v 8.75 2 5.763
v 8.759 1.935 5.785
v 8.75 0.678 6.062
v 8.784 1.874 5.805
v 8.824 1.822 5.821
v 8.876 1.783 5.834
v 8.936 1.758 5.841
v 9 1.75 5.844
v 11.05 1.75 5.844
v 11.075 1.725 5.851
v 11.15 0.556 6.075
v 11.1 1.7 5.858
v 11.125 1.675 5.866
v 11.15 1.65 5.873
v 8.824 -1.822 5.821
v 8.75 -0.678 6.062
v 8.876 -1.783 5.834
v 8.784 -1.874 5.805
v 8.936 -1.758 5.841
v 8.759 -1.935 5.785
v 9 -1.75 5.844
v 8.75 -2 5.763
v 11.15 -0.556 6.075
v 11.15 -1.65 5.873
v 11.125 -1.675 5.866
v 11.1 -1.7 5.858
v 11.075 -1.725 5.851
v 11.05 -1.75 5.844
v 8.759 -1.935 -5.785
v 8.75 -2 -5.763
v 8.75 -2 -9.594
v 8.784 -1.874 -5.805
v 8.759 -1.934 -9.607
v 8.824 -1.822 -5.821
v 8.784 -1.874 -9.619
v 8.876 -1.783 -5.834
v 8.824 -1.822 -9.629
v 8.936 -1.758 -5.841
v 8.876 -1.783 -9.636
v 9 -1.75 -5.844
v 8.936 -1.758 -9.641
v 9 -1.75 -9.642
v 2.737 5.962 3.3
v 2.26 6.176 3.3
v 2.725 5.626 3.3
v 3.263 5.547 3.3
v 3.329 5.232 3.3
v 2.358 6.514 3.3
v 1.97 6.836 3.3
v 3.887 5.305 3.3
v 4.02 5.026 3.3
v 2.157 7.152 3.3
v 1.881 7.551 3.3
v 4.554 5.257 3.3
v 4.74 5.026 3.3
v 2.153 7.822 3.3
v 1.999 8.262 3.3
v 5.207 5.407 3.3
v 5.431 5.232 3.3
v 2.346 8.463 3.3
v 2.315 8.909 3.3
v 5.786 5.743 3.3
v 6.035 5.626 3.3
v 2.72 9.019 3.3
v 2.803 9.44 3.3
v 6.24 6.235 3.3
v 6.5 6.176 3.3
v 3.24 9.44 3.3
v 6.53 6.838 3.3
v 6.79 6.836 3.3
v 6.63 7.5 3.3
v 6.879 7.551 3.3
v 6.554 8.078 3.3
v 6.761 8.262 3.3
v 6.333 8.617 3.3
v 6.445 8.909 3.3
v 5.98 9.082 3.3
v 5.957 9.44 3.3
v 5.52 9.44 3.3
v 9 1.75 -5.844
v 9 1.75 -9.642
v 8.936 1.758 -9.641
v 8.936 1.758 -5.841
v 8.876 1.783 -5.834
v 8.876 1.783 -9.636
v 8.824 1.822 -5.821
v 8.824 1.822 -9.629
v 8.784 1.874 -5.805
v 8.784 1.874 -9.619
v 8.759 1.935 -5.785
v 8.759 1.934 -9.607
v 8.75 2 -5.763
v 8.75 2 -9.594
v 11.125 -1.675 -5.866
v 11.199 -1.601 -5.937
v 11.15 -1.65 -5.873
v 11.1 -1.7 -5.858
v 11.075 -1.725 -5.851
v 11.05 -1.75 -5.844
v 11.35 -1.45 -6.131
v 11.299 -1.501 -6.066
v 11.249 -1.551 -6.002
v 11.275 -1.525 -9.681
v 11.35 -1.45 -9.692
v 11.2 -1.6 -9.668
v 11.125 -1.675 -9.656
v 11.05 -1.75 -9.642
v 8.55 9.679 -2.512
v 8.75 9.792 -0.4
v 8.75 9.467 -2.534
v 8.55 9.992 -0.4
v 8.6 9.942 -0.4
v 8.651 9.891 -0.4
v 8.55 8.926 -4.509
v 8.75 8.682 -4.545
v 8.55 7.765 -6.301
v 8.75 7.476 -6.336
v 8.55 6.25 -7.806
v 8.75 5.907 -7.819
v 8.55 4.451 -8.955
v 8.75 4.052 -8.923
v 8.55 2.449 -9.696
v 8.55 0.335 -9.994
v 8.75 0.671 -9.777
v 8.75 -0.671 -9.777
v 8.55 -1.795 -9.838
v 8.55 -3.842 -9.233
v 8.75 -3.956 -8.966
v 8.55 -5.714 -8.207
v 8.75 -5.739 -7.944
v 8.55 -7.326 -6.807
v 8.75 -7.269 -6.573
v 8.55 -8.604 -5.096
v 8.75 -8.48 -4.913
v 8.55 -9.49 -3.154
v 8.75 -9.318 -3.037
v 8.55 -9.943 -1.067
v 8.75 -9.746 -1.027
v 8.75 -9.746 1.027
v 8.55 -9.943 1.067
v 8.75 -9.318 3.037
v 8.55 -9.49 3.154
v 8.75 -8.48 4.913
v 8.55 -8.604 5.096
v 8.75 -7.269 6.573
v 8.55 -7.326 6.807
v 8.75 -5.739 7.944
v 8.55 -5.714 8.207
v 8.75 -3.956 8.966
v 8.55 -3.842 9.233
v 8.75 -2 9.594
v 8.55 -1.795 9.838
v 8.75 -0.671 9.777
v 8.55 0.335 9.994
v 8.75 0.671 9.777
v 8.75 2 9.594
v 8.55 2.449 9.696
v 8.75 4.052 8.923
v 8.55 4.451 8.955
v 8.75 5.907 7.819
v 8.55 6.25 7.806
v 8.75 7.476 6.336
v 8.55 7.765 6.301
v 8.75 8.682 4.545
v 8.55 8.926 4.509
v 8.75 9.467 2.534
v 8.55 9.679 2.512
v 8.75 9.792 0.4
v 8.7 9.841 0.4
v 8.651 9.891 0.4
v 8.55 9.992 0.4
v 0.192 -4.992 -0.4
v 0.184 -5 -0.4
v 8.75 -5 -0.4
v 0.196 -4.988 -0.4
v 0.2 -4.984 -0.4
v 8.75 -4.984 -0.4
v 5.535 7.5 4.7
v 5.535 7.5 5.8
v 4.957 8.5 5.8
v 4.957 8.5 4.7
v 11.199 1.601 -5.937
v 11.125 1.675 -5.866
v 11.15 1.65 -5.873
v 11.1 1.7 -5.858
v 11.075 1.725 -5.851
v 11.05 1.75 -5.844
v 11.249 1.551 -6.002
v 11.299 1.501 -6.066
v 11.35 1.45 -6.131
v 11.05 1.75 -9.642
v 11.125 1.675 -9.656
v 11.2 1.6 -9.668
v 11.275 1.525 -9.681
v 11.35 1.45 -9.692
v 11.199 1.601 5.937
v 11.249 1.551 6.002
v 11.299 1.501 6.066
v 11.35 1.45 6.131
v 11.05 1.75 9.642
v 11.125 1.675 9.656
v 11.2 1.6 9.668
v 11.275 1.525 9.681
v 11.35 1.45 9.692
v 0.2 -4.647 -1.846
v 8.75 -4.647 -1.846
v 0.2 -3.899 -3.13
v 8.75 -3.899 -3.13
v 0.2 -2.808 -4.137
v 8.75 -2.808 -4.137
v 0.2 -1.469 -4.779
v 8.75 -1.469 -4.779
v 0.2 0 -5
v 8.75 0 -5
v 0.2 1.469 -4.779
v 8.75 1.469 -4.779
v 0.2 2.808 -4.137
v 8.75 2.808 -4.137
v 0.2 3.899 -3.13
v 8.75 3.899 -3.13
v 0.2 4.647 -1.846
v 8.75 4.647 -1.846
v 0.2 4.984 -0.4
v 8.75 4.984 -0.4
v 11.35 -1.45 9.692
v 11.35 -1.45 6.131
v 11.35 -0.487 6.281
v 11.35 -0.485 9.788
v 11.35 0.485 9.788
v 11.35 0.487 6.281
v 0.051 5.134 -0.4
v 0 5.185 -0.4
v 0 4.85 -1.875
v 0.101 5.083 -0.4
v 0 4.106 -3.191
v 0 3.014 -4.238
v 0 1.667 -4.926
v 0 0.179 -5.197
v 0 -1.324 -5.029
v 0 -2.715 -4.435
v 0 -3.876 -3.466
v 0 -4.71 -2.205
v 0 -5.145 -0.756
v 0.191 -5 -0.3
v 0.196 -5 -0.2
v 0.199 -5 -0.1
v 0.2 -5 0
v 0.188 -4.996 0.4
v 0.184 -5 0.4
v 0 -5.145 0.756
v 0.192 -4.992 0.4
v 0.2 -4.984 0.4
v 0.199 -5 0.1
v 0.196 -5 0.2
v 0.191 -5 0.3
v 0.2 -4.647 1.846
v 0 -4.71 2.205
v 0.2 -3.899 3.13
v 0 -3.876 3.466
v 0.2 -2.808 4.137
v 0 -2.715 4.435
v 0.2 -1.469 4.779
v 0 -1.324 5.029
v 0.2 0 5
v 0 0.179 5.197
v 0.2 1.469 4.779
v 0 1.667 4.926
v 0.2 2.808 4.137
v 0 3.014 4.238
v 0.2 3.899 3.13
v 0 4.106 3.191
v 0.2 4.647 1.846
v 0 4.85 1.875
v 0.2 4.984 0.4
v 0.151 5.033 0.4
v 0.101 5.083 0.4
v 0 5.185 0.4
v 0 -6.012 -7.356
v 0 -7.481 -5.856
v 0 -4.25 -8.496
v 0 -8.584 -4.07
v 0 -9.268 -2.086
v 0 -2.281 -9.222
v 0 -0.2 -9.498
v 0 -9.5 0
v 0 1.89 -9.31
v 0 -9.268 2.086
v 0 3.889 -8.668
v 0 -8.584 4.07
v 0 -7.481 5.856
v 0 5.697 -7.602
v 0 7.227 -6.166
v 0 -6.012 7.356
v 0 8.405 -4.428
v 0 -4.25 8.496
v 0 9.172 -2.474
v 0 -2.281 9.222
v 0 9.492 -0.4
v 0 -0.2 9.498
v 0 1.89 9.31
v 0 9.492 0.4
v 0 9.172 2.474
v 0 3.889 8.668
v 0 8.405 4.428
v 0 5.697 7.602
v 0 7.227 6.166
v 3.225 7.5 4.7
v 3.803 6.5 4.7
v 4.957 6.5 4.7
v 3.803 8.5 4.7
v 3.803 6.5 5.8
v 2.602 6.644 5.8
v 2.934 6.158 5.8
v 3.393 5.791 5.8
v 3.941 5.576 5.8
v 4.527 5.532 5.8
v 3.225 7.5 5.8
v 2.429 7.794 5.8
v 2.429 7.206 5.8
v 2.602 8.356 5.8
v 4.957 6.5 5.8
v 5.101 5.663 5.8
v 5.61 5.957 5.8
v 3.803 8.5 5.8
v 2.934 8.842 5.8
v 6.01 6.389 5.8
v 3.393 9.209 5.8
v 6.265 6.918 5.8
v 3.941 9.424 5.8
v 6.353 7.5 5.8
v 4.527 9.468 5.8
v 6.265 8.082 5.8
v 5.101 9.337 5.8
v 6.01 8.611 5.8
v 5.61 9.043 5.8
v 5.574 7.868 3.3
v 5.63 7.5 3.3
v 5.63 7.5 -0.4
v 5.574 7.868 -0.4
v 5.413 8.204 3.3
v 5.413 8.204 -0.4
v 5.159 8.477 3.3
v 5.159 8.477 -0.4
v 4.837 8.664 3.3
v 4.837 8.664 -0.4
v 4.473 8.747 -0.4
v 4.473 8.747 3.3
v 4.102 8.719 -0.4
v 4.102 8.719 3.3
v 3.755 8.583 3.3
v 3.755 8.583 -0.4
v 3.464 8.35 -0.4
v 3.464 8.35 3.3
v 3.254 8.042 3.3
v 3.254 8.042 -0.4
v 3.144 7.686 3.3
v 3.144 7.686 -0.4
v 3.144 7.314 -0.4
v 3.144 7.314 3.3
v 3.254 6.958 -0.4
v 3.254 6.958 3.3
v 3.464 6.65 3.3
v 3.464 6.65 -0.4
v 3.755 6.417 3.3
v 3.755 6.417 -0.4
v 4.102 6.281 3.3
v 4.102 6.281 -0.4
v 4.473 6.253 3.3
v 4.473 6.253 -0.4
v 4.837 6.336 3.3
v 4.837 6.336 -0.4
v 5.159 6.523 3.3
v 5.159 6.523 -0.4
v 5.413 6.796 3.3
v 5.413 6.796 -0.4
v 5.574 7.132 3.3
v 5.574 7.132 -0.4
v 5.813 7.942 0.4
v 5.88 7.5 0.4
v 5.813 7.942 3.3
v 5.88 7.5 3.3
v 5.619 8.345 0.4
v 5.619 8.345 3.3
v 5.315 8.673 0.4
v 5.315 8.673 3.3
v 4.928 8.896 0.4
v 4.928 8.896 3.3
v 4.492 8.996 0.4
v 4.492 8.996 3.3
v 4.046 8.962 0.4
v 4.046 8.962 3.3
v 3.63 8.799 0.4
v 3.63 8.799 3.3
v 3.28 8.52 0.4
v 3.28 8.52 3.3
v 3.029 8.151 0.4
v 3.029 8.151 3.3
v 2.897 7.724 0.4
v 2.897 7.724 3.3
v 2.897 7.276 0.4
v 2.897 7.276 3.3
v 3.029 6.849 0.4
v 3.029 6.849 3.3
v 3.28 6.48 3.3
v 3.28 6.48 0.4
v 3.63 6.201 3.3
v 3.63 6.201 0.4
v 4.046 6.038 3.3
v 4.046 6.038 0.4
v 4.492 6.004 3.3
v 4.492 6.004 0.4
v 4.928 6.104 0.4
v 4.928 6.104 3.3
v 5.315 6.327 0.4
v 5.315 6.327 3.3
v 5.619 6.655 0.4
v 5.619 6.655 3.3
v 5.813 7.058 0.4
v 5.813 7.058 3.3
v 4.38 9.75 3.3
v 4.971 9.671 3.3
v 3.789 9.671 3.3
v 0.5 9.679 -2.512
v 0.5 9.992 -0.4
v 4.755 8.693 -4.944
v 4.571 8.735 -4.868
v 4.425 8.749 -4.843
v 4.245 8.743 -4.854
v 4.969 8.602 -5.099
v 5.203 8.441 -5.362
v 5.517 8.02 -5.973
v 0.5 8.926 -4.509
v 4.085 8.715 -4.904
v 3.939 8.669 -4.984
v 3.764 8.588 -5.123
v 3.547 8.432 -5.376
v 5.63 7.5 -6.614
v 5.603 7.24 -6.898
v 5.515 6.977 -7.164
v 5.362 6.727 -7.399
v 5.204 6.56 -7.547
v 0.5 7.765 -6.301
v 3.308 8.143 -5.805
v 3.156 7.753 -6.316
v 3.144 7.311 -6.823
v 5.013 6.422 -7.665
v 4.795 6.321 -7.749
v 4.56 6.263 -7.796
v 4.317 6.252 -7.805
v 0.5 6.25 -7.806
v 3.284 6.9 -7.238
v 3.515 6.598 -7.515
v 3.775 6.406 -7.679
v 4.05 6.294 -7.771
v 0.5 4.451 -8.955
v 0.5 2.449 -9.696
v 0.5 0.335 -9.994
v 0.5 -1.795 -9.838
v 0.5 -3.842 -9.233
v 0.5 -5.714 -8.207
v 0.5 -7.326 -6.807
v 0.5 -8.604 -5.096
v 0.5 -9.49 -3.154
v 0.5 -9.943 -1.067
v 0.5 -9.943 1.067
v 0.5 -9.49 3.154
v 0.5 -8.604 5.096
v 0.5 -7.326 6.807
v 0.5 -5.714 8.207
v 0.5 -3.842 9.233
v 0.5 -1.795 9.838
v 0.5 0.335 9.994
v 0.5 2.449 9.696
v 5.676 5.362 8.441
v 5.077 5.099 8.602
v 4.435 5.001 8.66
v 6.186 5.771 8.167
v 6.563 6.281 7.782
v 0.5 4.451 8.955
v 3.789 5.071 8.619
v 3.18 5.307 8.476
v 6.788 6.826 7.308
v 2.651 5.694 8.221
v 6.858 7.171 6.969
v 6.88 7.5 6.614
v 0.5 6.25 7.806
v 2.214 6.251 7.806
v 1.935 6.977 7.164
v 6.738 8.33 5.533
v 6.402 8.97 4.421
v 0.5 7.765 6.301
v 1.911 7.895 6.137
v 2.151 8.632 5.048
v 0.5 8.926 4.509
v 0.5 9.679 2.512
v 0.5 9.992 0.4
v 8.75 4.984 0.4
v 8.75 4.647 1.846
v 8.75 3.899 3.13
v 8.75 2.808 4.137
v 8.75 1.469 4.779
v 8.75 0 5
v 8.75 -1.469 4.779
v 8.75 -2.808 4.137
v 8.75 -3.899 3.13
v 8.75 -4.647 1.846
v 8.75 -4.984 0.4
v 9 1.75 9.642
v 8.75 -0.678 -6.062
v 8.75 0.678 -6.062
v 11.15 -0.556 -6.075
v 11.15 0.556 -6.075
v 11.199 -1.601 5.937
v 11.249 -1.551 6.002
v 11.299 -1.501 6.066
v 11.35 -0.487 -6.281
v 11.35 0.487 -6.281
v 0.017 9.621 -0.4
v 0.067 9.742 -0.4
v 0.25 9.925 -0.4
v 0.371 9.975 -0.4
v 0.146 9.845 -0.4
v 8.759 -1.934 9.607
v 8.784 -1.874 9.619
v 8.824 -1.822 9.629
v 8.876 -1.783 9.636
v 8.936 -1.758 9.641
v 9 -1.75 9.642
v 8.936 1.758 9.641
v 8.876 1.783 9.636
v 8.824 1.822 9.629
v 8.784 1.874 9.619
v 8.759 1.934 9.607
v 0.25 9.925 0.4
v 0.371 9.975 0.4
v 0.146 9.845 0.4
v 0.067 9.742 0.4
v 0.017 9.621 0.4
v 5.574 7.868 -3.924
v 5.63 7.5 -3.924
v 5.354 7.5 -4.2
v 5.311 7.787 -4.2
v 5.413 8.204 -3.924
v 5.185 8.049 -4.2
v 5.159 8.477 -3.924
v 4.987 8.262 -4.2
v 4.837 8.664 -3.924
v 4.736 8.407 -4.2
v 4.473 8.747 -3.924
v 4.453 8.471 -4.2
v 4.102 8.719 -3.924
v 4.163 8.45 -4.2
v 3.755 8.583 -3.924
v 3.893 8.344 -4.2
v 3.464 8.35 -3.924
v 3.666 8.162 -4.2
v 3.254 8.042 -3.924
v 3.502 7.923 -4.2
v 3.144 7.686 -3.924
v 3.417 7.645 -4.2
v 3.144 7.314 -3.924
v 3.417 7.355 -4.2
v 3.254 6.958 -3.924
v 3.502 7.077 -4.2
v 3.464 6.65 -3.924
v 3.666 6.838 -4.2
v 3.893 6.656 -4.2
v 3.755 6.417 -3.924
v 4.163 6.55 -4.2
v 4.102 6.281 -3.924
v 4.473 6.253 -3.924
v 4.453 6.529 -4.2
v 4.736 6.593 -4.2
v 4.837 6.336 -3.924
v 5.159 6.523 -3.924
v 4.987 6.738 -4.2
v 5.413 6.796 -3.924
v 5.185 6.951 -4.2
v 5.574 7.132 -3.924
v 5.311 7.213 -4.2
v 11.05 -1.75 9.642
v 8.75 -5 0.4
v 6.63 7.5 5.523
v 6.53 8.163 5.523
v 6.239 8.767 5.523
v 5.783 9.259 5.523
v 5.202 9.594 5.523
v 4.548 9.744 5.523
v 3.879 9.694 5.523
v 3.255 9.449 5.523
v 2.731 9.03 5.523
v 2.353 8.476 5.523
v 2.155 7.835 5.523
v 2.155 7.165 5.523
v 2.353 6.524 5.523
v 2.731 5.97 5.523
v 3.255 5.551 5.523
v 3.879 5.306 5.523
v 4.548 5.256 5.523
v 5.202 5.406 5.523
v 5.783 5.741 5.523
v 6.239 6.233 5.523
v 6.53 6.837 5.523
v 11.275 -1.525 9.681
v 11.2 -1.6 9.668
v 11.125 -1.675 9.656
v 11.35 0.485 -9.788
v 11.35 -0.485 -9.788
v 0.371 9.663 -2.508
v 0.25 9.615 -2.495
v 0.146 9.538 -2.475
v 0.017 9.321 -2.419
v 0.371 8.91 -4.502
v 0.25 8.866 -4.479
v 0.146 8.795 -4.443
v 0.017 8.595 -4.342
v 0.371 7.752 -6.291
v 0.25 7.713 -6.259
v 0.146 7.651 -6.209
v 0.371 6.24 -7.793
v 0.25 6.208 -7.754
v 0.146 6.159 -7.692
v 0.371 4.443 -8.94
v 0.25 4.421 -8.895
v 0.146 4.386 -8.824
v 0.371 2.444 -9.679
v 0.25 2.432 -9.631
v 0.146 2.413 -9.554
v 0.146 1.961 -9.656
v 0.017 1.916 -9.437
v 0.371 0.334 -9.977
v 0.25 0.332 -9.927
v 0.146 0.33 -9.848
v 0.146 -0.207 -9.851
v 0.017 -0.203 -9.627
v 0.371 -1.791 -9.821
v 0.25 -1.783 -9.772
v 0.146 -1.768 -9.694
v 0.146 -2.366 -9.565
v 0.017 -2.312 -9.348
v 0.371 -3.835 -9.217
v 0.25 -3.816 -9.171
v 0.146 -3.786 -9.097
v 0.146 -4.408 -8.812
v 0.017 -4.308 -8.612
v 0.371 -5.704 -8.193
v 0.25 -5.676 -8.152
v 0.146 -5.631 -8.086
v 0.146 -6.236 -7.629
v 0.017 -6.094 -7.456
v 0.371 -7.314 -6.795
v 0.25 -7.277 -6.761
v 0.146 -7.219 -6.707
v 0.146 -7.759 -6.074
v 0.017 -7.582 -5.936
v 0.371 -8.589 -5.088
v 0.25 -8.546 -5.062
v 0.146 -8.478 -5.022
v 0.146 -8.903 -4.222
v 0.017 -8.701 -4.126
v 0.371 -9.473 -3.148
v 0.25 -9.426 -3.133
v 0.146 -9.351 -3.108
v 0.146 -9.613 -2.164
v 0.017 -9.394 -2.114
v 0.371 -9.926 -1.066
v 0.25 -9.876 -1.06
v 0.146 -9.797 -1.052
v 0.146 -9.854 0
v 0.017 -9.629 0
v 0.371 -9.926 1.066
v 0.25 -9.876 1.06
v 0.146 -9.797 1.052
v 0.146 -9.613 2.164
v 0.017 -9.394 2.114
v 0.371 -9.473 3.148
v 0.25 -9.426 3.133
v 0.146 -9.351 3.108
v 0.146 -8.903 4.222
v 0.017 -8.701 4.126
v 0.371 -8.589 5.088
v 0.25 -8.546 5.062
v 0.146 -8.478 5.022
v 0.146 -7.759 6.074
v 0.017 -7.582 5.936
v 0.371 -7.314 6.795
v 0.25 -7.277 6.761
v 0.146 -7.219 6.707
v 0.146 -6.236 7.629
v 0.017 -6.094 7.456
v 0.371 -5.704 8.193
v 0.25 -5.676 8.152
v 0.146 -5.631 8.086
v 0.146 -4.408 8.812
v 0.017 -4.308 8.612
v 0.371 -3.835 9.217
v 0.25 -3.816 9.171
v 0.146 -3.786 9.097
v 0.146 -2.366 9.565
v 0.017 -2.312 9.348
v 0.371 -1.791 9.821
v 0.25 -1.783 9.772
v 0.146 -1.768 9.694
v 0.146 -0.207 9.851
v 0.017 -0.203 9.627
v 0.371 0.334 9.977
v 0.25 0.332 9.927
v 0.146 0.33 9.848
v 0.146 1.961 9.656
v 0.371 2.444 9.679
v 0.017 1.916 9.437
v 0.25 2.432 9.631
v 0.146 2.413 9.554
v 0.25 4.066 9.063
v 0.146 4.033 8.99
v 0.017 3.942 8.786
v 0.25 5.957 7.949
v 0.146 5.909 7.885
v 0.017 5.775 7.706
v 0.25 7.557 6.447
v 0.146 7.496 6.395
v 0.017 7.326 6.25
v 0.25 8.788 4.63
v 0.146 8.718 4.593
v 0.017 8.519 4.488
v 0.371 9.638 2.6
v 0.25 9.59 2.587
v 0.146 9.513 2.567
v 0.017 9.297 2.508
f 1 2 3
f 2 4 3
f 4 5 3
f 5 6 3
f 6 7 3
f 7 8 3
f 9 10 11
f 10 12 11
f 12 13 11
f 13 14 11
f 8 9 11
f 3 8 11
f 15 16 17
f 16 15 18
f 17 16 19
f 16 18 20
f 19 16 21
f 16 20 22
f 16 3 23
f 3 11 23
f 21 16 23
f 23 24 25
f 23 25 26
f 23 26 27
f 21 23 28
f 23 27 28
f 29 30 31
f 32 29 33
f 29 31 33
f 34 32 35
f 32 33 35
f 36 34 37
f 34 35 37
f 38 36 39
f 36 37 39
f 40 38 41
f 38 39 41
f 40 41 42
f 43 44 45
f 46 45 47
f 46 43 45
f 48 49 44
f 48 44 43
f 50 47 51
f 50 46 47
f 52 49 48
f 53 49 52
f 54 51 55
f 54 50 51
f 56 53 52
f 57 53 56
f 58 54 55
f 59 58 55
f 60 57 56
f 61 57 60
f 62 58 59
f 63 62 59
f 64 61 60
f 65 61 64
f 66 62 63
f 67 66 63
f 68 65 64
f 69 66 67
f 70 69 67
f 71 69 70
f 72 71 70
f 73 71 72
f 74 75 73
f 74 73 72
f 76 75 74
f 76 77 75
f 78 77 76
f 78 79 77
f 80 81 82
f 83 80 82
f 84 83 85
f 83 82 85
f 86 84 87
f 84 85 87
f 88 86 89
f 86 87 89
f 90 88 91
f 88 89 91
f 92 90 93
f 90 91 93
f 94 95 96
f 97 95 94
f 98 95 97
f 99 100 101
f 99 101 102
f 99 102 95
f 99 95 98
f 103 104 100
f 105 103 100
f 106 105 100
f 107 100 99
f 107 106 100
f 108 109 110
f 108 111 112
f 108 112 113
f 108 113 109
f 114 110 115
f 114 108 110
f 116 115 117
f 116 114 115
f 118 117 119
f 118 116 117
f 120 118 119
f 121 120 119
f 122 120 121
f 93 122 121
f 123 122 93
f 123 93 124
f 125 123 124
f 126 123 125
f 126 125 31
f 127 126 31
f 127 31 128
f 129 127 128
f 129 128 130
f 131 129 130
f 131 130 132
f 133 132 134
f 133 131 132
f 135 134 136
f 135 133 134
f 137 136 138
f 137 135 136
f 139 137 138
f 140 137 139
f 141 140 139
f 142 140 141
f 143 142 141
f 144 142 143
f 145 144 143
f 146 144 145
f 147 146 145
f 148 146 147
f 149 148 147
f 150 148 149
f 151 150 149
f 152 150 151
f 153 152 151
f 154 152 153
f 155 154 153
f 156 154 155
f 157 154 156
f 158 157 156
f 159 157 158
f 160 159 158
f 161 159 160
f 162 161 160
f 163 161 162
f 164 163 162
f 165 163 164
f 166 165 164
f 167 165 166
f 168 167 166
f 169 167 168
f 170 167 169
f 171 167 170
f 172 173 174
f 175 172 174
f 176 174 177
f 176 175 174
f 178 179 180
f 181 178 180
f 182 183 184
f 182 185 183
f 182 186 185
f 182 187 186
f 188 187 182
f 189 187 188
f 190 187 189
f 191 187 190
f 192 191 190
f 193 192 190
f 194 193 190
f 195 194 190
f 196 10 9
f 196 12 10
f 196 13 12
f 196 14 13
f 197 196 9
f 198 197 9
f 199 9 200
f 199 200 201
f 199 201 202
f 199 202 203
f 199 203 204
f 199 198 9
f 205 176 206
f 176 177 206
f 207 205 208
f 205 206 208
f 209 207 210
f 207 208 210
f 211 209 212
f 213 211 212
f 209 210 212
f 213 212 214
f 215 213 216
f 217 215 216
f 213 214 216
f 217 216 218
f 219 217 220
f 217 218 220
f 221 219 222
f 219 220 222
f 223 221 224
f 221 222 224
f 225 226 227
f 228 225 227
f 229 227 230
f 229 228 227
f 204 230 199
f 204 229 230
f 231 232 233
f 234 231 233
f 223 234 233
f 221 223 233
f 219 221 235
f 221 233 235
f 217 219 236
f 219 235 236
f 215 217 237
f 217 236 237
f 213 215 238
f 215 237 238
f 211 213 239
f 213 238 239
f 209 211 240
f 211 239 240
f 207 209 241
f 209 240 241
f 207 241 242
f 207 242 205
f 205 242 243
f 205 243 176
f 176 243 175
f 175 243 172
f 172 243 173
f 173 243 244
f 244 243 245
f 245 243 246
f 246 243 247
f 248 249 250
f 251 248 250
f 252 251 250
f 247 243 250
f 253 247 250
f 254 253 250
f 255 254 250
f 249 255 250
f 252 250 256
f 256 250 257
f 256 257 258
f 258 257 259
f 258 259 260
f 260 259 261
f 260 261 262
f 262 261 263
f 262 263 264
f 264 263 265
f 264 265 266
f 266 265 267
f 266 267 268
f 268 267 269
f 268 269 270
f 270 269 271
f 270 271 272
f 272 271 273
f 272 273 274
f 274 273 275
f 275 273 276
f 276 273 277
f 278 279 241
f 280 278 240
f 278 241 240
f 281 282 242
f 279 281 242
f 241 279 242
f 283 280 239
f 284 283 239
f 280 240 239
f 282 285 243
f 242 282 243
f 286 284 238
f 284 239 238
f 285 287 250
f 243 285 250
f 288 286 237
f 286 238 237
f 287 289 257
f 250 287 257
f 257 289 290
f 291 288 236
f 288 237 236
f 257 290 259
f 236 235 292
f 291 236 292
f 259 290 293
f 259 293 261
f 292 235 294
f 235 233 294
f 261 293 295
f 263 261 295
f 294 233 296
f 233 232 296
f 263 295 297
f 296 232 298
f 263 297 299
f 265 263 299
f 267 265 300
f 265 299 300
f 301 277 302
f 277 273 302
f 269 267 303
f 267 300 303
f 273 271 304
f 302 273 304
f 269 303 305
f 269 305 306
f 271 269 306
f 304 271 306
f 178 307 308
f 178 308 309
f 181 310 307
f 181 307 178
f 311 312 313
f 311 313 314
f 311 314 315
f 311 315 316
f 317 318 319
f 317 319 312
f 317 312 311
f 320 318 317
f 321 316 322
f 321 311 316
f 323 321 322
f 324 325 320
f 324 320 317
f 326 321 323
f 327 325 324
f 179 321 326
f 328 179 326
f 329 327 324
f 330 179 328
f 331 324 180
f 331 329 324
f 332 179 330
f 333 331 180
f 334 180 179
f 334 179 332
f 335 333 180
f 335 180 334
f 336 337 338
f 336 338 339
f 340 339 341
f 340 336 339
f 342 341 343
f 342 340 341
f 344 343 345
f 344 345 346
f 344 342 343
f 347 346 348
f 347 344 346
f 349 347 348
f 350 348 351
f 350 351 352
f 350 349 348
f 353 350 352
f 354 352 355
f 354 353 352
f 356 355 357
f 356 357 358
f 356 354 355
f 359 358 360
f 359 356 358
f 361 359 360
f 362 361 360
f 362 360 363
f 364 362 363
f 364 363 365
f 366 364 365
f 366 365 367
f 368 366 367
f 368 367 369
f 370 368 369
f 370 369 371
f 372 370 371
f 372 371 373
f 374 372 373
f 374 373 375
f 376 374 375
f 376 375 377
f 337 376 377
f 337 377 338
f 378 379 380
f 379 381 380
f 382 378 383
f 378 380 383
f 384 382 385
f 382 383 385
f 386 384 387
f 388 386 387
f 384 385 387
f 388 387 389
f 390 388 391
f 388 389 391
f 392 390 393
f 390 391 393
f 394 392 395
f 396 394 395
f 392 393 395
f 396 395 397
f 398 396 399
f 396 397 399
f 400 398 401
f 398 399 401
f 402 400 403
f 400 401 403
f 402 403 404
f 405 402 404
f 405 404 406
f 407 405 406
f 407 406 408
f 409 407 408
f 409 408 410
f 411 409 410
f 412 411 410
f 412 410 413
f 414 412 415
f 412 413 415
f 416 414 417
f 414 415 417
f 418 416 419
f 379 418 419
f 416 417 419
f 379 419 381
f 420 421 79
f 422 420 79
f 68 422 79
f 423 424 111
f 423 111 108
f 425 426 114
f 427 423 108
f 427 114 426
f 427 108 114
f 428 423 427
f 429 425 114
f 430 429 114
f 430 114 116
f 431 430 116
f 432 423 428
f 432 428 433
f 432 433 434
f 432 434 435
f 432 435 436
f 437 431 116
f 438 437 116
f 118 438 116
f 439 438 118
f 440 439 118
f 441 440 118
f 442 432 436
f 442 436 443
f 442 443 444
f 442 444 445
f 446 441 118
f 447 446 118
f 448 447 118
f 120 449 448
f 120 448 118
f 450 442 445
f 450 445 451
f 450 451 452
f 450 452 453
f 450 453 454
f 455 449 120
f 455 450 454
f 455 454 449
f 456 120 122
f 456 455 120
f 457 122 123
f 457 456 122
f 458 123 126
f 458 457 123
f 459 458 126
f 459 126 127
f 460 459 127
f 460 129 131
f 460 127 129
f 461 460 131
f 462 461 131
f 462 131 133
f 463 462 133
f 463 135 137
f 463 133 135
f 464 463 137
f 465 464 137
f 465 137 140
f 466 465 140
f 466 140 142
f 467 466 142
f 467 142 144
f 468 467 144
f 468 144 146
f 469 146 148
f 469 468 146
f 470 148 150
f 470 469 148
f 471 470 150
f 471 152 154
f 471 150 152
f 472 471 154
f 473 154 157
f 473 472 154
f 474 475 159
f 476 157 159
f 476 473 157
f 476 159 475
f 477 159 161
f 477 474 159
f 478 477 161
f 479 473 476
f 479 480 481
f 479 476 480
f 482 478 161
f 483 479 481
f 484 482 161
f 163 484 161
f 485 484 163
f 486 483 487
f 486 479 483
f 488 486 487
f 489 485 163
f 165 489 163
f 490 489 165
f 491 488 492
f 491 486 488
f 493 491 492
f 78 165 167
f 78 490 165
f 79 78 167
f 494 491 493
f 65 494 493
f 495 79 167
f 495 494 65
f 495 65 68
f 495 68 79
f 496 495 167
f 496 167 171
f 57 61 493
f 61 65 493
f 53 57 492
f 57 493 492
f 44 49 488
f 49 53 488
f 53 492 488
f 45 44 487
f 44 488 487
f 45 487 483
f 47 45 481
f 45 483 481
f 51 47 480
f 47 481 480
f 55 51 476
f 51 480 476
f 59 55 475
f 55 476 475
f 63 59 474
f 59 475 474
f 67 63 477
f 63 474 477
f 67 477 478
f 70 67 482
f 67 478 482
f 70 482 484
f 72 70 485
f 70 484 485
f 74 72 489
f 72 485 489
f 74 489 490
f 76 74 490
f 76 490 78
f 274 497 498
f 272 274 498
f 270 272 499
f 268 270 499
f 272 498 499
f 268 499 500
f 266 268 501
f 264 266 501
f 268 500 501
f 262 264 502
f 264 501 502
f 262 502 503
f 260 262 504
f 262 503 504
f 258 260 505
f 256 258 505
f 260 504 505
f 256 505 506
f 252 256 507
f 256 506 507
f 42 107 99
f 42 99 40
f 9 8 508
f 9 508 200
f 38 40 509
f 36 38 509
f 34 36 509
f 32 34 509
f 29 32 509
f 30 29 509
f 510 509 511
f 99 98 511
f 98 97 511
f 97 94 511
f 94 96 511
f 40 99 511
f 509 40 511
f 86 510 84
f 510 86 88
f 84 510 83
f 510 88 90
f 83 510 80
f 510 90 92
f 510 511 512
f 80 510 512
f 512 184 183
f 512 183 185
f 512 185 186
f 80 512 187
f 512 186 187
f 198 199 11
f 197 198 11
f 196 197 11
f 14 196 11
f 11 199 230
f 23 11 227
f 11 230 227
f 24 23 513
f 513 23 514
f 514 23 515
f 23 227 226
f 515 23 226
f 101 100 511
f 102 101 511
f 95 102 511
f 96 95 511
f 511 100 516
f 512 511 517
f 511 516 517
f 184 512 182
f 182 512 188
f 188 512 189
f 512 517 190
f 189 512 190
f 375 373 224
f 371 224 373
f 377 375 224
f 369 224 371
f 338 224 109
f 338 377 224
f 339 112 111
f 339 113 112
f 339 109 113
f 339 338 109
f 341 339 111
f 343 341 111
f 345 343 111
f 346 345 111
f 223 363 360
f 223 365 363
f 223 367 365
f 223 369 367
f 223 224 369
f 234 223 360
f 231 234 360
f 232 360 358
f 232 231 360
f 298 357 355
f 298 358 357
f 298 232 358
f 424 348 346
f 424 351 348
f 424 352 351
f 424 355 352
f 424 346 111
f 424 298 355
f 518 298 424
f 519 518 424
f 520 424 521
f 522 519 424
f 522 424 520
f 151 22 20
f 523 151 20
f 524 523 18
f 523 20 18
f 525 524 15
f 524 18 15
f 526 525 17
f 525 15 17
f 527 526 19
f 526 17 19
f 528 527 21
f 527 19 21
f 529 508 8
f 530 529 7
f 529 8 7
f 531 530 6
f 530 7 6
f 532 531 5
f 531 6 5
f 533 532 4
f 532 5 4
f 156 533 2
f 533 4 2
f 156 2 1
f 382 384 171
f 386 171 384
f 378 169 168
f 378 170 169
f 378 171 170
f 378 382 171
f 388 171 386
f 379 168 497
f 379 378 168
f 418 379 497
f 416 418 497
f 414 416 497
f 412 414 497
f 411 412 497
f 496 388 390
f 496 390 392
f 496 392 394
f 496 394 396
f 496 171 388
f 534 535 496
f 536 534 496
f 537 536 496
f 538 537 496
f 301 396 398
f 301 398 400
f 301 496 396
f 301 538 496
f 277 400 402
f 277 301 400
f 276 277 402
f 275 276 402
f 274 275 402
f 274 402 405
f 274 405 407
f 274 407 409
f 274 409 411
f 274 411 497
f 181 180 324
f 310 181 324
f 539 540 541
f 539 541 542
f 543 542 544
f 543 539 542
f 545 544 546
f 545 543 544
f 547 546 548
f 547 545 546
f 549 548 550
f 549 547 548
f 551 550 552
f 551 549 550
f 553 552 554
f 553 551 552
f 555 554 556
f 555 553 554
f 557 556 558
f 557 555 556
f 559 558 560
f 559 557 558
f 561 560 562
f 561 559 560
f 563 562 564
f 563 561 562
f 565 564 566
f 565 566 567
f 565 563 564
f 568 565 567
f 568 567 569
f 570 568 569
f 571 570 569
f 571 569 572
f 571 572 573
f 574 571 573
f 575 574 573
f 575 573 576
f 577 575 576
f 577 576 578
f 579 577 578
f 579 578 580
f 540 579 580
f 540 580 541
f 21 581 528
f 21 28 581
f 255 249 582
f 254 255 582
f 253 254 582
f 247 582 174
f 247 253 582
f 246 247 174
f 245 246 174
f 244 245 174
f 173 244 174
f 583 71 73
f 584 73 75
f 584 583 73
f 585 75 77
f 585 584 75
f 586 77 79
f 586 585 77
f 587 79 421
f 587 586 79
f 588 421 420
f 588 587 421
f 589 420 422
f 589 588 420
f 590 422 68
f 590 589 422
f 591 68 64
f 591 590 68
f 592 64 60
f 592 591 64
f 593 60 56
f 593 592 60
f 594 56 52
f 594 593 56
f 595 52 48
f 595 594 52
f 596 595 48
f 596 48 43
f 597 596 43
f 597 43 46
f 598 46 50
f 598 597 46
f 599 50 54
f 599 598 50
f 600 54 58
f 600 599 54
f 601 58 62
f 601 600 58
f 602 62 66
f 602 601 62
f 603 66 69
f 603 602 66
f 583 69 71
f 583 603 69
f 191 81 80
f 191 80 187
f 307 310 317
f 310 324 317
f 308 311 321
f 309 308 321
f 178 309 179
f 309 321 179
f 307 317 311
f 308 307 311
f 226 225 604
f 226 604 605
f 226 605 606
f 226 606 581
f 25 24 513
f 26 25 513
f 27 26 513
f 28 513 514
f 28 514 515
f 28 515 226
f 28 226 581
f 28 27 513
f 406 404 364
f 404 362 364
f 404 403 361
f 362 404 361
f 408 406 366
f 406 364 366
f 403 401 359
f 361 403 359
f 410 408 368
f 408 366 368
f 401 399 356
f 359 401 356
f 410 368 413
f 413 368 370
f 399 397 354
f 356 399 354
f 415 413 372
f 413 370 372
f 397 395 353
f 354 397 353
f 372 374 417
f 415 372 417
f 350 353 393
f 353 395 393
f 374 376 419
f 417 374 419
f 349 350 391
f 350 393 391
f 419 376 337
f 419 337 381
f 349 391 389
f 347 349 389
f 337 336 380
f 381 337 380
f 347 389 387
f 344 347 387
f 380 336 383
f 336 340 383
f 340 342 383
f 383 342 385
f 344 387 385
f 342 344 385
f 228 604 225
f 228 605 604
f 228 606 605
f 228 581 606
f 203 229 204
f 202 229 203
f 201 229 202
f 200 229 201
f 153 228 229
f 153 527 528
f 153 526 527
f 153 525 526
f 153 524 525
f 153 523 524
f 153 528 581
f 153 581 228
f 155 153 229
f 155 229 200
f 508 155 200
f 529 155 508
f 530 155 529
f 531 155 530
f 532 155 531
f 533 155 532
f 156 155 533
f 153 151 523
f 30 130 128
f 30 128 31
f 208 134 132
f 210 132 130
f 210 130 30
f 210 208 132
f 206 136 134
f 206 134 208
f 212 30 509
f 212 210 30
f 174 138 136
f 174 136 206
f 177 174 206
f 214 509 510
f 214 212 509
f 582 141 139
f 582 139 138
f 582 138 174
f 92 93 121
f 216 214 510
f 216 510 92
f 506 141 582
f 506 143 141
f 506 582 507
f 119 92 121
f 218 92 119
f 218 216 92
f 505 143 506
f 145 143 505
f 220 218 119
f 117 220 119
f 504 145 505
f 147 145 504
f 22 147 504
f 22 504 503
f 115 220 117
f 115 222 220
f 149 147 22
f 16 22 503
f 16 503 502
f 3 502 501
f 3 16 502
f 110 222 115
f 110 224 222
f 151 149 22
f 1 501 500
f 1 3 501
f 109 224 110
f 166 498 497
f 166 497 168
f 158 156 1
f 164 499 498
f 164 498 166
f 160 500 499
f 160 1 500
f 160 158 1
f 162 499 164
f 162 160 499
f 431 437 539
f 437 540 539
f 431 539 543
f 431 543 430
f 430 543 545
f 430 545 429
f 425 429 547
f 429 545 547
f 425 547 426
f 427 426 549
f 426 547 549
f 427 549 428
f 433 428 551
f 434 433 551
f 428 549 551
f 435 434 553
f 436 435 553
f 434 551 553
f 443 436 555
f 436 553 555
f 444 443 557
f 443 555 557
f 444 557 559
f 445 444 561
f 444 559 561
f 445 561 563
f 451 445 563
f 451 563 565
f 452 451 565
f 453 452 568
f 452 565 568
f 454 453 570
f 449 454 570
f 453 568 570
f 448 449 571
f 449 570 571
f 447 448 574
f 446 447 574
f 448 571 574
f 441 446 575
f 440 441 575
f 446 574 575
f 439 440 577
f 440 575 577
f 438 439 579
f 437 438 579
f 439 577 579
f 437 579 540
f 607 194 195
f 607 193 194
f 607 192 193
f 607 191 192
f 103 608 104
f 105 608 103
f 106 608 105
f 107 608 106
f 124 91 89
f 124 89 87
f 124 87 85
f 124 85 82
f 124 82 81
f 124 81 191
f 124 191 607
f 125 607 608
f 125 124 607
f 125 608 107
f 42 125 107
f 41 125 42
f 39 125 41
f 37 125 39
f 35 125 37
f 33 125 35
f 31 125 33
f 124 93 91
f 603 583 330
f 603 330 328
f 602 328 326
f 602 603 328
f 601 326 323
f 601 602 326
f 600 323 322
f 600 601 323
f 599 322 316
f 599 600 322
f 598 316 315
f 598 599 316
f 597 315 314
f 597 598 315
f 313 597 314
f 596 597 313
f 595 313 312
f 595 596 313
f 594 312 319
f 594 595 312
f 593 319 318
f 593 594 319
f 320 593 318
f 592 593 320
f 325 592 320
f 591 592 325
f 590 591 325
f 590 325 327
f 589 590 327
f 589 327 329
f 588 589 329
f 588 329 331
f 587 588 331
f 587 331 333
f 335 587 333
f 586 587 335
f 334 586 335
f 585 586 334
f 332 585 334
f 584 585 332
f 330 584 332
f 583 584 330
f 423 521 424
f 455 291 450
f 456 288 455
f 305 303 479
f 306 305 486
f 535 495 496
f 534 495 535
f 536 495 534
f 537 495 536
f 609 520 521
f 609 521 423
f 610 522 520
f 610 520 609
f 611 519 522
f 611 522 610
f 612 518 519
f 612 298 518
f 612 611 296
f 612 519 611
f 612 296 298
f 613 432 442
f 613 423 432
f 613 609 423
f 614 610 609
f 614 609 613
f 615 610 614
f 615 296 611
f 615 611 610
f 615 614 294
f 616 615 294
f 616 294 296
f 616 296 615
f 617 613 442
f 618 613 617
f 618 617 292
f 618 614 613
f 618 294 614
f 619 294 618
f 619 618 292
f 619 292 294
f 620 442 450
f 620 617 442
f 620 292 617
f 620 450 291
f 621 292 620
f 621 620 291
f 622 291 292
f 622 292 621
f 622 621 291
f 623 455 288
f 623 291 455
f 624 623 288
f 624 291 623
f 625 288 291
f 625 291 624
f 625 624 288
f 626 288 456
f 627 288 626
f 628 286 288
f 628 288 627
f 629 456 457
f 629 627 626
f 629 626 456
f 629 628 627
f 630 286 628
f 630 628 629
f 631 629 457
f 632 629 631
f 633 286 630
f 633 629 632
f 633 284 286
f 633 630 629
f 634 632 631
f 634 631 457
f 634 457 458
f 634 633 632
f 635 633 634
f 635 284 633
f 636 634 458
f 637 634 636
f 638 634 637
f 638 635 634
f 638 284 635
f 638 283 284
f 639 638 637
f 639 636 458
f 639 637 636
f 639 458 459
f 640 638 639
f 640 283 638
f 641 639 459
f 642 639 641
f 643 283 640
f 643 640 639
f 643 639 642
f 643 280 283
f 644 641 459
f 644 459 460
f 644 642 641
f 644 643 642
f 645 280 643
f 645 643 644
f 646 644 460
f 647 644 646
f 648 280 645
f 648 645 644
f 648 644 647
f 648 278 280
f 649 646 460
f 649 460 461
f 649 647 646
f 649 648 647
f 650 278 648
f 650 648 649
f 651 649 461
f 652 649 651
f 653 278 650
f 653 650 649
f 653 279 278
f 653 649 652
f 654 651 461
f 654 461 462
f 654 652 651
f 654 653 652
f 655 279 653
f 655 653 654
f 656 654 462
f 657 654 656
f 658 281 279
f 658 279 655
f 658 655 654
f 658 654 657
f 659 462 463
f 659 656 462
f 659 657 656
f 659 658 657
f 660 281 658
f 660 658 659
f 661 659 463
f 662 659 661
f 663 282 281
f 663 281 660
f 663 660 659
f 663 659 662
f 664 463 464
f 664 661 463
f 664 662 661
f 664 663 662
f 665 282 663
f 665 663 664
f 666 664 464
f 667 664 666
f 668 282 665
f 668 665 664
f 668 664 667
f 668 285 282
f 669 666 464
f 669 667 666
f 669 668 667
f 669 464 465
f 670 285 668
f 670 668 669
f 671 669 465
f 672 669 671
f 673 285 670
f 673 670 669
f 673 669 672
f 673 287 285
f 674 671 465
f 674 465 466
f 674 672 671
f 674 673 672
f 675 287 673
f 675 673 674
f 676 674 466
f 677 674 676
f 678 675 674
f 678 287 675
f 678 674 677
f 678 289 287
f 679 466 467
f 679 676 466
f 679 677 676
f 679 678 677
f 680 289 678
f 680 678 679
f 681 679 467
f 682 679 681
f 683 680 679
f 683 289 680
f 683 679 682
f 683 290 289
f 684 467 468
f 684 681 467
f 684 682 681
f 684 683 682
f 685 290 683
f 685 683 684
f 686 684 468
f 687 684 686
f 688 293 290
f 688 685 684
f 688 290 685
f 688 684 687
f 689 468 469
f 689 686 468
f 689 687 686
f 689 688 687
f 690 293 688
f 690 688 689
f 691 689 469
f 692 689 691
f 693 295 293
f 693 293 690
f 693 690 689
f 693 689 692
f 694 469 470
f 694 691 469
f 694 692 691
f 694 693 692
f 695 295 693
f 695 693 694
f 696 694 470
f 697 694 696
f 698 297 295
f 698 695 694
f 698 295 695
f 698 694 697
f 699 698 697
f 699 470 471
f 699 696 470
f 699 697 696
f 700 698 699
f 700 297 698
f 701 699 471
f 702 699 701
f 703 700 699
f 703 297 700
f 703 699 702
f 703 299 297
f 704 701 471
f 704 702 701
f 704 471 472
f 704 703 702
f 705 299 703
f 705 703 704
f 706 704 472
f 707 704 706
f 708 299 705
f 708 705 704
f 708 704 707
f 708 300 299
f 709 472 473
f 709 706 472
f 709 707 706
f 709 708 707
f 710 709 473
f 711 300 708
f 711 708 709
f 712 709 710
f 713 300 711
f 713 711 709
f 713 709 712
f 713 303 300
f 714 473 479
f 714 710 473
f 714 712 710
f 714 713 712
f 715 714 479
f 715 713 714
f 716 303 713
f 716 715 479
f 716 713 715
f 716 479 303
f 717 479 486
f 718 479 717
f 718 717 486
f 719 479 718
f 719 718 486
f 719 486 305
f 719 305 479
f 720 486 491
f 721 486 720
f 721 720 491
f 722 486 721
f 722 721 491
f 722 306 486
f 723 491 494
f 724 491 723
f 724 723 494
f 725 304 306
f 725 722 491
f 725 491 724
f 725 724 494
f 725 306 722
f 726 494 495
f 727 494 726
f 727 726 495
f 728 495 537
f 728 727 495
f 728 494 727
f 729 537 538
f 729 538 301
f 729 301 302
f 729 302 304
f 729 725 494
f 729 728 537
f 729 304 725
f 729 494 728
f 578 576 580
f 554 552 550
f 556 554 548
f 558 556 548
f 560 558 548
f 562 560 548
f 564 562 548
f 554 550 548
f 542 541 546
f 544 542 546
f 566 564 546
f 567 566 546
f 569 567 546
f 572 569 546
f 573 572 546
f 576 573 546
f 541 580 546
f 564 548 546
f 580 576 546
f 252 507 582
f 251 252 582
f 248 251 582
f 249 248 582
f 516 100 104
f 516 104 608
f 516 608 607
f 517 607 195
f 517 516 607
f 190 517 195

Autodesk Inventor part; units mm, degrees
sketch "Sketch_1" plane through (0, 0, 0) normal (0, 0, 1) x (1, 0, 0)
  line L0 (11.35, 0) -> (0, 0)
  line L1 (0, 5.2) -> (0.2, 5)
  line L2 (0.2, 5) -> (8.75, 5)
  line L3 (8.75, 5) -> (8.75, 6.1)
  line L4 (8.75, 6.1) -> (11.15, 6.1)
  line L5 (11.15, 6.1) -> (11.35, 6.3)
  line L6 (11.35, 6.3) -> (11.35, 9.8)
  line L7 (11.35, 9.8) -> (8.75, 9.8)
  line L8 (8.75, 9.8) -> (8.55, 10)
  line L9 (8.55, 10) -> (0.5, 10)
  arc A0 (0.5, 10) -> (0, 9.5) centre (0.5, 9.5) ccw
  line L10 (0, 9.5) -> (0, 5.2)
revolve "Revolution1" add sketch "Sketch_1" angle 360 about axis through (11.35, 0, 0) along (1, 0, 0)
sketch "Sketch_2" plane through (0, 0, 0) normal (0, 0, 1) x (1, 0, 0)
  arc A0 (8.75, 2) -> (9, 1.75) centre (9, 2) ccw
  line L0 (9, 1.75) -> (11.05, 1.75)
  line L1 (11.05, 1.75) -> (11.35, 1.45)
  line L2 (11.35, 1.45) -> (11.35, -1.45)
  line L3 (11.35, -1.45) -> (11.05, -1.75)
  line L4 (11.05, -1.75) -> (9, -1.75)
  arc A1 (9, -1.75) -> (8.75, -2) centre (9, -2) ccw
  line L5 (8.75, -2) -> (8.75, -10)
  line L6 (8.75, -10) -> (12.35, -10)
  line L7 (12.35, -10) -> (12.35, 10)
  line L8 (12.35, 10) -> (8.75, 10)
  line L9 (8.75, 10) -> (8.75, 2)
extrude "Extrusion1" cut sketch "Sketch_2" along normal mid plane 20
sketch "Sketch_3" plane through (0, 7.5, 0) normal (0, 1, 0) x (1, 0, 0)
  line L0 (4.38, -10) -> (4.38, 10)
  line L1 (4.38, 10) -> (5.63, 10)
  line L2 (5.63, 10) -> (5.63, 0)
  line L3 (5.63, 0) -> (5.88, 0)
  line L4 (5.88, 0) -> (5.88, -3.3)
  line L5 (5.88, -3.3) -> (6.88, -3.3)
  line L6 (6.88, -3.3) -> (6.88, -10)
  line L7 (6.88, -10) -> (4.38, -10)
  line L8 (4.38, -10) -> (4.38, 10)
revolve "Revolution2" cut sketch "Sketch_3" angle 360 about axis through (4.38, 7.5, 10) along (0, 0, 1)
sketch "Sketch_4" plane through (0, 0, 0) normal (1, 0, 0) x (0, 1, 0)
  line L0 (-5, 0.4) -> (-5, -0.4)
  line L1 (-5, -0.4) -> (10, -0.4)
  line L2 (10, -0.4) -> (10, 0.4)
  line L3 (10, 0.4) -> (-5, 0.4)
extrude "Extrusion2" cut sketch "Sketch_4" along normal blind 8.75
sketch "Sketch_5" plane through (0, 7.5, 0) normal (0, 1, 0) x (1, 0, 0)
  line L0 (4.38, -5.8) -> (4.38, 4.2)
  line L1 (4.38, 4.2) -> (5.354, 4.2)
  line L2 (5.354, 4.2) -> (5.63, 3.924)
  line L3 (5.63, 3.924) -> (5.63, -3.3)
  line L4 (5.63, -3.3) -> (6.63, -3.3)
  line L5 (6.63, -3.3) -> (6.63, -5.5231)
  line L6 (6.63, -5.5231) -> (6.3531, -5.8)
  line L7 (6.3531, -5.8) -> (4.38, -5.8)
  line L8 (4.38, -5.8) -> (4.38, 4.2)
revolve "Revolution3" add sketch "Sketch_5" angle 360 about axis through (4.38, 7.5, 5.8) along (0, 0, 1)
thread "Thread1" size "M2.5x0.45" class "6g" standard "ISO Metric profile" full length
sketch "Sketch_6" plane through (0, 0, 5.8) normal (0, 0, 1) x (1, 0, 0)
  line L0 (3.2253, 7.5) -> (3.8026, 6.5)
  line L1 (3.8026, 6.5) -> (4.9574, 6.5)
  line L2 (4.9574, 6.5) -> (5.5347, 7.5)
  line L3 (5.5347, 7.5) -> (4.9574, 8.5)
  line L4 (4.9574, 8.5) -> (3.8026, 8.5)
  line L5 (3.8026, 8.5) -> (3.2253, 7.5)
extrude "Extrusion3" cut sketch "Sketch_6" against normal blind 1.1
ref_plane "p3_p2_XY" through (9, 0, 0) normal (-1, 0, 0) x (0, 0, -1)
ref_plane "p3_p2_YZ" through (9, 0, 0) normal (0, 0, -1) x (0, -1, 0)
ref_plane "p3_p2_ZX" through (9, 0, 0) normal (0, -1, 0) x (-1, 0, 0)
properties part number "MOR-20C - 6-10 Hub 2"
